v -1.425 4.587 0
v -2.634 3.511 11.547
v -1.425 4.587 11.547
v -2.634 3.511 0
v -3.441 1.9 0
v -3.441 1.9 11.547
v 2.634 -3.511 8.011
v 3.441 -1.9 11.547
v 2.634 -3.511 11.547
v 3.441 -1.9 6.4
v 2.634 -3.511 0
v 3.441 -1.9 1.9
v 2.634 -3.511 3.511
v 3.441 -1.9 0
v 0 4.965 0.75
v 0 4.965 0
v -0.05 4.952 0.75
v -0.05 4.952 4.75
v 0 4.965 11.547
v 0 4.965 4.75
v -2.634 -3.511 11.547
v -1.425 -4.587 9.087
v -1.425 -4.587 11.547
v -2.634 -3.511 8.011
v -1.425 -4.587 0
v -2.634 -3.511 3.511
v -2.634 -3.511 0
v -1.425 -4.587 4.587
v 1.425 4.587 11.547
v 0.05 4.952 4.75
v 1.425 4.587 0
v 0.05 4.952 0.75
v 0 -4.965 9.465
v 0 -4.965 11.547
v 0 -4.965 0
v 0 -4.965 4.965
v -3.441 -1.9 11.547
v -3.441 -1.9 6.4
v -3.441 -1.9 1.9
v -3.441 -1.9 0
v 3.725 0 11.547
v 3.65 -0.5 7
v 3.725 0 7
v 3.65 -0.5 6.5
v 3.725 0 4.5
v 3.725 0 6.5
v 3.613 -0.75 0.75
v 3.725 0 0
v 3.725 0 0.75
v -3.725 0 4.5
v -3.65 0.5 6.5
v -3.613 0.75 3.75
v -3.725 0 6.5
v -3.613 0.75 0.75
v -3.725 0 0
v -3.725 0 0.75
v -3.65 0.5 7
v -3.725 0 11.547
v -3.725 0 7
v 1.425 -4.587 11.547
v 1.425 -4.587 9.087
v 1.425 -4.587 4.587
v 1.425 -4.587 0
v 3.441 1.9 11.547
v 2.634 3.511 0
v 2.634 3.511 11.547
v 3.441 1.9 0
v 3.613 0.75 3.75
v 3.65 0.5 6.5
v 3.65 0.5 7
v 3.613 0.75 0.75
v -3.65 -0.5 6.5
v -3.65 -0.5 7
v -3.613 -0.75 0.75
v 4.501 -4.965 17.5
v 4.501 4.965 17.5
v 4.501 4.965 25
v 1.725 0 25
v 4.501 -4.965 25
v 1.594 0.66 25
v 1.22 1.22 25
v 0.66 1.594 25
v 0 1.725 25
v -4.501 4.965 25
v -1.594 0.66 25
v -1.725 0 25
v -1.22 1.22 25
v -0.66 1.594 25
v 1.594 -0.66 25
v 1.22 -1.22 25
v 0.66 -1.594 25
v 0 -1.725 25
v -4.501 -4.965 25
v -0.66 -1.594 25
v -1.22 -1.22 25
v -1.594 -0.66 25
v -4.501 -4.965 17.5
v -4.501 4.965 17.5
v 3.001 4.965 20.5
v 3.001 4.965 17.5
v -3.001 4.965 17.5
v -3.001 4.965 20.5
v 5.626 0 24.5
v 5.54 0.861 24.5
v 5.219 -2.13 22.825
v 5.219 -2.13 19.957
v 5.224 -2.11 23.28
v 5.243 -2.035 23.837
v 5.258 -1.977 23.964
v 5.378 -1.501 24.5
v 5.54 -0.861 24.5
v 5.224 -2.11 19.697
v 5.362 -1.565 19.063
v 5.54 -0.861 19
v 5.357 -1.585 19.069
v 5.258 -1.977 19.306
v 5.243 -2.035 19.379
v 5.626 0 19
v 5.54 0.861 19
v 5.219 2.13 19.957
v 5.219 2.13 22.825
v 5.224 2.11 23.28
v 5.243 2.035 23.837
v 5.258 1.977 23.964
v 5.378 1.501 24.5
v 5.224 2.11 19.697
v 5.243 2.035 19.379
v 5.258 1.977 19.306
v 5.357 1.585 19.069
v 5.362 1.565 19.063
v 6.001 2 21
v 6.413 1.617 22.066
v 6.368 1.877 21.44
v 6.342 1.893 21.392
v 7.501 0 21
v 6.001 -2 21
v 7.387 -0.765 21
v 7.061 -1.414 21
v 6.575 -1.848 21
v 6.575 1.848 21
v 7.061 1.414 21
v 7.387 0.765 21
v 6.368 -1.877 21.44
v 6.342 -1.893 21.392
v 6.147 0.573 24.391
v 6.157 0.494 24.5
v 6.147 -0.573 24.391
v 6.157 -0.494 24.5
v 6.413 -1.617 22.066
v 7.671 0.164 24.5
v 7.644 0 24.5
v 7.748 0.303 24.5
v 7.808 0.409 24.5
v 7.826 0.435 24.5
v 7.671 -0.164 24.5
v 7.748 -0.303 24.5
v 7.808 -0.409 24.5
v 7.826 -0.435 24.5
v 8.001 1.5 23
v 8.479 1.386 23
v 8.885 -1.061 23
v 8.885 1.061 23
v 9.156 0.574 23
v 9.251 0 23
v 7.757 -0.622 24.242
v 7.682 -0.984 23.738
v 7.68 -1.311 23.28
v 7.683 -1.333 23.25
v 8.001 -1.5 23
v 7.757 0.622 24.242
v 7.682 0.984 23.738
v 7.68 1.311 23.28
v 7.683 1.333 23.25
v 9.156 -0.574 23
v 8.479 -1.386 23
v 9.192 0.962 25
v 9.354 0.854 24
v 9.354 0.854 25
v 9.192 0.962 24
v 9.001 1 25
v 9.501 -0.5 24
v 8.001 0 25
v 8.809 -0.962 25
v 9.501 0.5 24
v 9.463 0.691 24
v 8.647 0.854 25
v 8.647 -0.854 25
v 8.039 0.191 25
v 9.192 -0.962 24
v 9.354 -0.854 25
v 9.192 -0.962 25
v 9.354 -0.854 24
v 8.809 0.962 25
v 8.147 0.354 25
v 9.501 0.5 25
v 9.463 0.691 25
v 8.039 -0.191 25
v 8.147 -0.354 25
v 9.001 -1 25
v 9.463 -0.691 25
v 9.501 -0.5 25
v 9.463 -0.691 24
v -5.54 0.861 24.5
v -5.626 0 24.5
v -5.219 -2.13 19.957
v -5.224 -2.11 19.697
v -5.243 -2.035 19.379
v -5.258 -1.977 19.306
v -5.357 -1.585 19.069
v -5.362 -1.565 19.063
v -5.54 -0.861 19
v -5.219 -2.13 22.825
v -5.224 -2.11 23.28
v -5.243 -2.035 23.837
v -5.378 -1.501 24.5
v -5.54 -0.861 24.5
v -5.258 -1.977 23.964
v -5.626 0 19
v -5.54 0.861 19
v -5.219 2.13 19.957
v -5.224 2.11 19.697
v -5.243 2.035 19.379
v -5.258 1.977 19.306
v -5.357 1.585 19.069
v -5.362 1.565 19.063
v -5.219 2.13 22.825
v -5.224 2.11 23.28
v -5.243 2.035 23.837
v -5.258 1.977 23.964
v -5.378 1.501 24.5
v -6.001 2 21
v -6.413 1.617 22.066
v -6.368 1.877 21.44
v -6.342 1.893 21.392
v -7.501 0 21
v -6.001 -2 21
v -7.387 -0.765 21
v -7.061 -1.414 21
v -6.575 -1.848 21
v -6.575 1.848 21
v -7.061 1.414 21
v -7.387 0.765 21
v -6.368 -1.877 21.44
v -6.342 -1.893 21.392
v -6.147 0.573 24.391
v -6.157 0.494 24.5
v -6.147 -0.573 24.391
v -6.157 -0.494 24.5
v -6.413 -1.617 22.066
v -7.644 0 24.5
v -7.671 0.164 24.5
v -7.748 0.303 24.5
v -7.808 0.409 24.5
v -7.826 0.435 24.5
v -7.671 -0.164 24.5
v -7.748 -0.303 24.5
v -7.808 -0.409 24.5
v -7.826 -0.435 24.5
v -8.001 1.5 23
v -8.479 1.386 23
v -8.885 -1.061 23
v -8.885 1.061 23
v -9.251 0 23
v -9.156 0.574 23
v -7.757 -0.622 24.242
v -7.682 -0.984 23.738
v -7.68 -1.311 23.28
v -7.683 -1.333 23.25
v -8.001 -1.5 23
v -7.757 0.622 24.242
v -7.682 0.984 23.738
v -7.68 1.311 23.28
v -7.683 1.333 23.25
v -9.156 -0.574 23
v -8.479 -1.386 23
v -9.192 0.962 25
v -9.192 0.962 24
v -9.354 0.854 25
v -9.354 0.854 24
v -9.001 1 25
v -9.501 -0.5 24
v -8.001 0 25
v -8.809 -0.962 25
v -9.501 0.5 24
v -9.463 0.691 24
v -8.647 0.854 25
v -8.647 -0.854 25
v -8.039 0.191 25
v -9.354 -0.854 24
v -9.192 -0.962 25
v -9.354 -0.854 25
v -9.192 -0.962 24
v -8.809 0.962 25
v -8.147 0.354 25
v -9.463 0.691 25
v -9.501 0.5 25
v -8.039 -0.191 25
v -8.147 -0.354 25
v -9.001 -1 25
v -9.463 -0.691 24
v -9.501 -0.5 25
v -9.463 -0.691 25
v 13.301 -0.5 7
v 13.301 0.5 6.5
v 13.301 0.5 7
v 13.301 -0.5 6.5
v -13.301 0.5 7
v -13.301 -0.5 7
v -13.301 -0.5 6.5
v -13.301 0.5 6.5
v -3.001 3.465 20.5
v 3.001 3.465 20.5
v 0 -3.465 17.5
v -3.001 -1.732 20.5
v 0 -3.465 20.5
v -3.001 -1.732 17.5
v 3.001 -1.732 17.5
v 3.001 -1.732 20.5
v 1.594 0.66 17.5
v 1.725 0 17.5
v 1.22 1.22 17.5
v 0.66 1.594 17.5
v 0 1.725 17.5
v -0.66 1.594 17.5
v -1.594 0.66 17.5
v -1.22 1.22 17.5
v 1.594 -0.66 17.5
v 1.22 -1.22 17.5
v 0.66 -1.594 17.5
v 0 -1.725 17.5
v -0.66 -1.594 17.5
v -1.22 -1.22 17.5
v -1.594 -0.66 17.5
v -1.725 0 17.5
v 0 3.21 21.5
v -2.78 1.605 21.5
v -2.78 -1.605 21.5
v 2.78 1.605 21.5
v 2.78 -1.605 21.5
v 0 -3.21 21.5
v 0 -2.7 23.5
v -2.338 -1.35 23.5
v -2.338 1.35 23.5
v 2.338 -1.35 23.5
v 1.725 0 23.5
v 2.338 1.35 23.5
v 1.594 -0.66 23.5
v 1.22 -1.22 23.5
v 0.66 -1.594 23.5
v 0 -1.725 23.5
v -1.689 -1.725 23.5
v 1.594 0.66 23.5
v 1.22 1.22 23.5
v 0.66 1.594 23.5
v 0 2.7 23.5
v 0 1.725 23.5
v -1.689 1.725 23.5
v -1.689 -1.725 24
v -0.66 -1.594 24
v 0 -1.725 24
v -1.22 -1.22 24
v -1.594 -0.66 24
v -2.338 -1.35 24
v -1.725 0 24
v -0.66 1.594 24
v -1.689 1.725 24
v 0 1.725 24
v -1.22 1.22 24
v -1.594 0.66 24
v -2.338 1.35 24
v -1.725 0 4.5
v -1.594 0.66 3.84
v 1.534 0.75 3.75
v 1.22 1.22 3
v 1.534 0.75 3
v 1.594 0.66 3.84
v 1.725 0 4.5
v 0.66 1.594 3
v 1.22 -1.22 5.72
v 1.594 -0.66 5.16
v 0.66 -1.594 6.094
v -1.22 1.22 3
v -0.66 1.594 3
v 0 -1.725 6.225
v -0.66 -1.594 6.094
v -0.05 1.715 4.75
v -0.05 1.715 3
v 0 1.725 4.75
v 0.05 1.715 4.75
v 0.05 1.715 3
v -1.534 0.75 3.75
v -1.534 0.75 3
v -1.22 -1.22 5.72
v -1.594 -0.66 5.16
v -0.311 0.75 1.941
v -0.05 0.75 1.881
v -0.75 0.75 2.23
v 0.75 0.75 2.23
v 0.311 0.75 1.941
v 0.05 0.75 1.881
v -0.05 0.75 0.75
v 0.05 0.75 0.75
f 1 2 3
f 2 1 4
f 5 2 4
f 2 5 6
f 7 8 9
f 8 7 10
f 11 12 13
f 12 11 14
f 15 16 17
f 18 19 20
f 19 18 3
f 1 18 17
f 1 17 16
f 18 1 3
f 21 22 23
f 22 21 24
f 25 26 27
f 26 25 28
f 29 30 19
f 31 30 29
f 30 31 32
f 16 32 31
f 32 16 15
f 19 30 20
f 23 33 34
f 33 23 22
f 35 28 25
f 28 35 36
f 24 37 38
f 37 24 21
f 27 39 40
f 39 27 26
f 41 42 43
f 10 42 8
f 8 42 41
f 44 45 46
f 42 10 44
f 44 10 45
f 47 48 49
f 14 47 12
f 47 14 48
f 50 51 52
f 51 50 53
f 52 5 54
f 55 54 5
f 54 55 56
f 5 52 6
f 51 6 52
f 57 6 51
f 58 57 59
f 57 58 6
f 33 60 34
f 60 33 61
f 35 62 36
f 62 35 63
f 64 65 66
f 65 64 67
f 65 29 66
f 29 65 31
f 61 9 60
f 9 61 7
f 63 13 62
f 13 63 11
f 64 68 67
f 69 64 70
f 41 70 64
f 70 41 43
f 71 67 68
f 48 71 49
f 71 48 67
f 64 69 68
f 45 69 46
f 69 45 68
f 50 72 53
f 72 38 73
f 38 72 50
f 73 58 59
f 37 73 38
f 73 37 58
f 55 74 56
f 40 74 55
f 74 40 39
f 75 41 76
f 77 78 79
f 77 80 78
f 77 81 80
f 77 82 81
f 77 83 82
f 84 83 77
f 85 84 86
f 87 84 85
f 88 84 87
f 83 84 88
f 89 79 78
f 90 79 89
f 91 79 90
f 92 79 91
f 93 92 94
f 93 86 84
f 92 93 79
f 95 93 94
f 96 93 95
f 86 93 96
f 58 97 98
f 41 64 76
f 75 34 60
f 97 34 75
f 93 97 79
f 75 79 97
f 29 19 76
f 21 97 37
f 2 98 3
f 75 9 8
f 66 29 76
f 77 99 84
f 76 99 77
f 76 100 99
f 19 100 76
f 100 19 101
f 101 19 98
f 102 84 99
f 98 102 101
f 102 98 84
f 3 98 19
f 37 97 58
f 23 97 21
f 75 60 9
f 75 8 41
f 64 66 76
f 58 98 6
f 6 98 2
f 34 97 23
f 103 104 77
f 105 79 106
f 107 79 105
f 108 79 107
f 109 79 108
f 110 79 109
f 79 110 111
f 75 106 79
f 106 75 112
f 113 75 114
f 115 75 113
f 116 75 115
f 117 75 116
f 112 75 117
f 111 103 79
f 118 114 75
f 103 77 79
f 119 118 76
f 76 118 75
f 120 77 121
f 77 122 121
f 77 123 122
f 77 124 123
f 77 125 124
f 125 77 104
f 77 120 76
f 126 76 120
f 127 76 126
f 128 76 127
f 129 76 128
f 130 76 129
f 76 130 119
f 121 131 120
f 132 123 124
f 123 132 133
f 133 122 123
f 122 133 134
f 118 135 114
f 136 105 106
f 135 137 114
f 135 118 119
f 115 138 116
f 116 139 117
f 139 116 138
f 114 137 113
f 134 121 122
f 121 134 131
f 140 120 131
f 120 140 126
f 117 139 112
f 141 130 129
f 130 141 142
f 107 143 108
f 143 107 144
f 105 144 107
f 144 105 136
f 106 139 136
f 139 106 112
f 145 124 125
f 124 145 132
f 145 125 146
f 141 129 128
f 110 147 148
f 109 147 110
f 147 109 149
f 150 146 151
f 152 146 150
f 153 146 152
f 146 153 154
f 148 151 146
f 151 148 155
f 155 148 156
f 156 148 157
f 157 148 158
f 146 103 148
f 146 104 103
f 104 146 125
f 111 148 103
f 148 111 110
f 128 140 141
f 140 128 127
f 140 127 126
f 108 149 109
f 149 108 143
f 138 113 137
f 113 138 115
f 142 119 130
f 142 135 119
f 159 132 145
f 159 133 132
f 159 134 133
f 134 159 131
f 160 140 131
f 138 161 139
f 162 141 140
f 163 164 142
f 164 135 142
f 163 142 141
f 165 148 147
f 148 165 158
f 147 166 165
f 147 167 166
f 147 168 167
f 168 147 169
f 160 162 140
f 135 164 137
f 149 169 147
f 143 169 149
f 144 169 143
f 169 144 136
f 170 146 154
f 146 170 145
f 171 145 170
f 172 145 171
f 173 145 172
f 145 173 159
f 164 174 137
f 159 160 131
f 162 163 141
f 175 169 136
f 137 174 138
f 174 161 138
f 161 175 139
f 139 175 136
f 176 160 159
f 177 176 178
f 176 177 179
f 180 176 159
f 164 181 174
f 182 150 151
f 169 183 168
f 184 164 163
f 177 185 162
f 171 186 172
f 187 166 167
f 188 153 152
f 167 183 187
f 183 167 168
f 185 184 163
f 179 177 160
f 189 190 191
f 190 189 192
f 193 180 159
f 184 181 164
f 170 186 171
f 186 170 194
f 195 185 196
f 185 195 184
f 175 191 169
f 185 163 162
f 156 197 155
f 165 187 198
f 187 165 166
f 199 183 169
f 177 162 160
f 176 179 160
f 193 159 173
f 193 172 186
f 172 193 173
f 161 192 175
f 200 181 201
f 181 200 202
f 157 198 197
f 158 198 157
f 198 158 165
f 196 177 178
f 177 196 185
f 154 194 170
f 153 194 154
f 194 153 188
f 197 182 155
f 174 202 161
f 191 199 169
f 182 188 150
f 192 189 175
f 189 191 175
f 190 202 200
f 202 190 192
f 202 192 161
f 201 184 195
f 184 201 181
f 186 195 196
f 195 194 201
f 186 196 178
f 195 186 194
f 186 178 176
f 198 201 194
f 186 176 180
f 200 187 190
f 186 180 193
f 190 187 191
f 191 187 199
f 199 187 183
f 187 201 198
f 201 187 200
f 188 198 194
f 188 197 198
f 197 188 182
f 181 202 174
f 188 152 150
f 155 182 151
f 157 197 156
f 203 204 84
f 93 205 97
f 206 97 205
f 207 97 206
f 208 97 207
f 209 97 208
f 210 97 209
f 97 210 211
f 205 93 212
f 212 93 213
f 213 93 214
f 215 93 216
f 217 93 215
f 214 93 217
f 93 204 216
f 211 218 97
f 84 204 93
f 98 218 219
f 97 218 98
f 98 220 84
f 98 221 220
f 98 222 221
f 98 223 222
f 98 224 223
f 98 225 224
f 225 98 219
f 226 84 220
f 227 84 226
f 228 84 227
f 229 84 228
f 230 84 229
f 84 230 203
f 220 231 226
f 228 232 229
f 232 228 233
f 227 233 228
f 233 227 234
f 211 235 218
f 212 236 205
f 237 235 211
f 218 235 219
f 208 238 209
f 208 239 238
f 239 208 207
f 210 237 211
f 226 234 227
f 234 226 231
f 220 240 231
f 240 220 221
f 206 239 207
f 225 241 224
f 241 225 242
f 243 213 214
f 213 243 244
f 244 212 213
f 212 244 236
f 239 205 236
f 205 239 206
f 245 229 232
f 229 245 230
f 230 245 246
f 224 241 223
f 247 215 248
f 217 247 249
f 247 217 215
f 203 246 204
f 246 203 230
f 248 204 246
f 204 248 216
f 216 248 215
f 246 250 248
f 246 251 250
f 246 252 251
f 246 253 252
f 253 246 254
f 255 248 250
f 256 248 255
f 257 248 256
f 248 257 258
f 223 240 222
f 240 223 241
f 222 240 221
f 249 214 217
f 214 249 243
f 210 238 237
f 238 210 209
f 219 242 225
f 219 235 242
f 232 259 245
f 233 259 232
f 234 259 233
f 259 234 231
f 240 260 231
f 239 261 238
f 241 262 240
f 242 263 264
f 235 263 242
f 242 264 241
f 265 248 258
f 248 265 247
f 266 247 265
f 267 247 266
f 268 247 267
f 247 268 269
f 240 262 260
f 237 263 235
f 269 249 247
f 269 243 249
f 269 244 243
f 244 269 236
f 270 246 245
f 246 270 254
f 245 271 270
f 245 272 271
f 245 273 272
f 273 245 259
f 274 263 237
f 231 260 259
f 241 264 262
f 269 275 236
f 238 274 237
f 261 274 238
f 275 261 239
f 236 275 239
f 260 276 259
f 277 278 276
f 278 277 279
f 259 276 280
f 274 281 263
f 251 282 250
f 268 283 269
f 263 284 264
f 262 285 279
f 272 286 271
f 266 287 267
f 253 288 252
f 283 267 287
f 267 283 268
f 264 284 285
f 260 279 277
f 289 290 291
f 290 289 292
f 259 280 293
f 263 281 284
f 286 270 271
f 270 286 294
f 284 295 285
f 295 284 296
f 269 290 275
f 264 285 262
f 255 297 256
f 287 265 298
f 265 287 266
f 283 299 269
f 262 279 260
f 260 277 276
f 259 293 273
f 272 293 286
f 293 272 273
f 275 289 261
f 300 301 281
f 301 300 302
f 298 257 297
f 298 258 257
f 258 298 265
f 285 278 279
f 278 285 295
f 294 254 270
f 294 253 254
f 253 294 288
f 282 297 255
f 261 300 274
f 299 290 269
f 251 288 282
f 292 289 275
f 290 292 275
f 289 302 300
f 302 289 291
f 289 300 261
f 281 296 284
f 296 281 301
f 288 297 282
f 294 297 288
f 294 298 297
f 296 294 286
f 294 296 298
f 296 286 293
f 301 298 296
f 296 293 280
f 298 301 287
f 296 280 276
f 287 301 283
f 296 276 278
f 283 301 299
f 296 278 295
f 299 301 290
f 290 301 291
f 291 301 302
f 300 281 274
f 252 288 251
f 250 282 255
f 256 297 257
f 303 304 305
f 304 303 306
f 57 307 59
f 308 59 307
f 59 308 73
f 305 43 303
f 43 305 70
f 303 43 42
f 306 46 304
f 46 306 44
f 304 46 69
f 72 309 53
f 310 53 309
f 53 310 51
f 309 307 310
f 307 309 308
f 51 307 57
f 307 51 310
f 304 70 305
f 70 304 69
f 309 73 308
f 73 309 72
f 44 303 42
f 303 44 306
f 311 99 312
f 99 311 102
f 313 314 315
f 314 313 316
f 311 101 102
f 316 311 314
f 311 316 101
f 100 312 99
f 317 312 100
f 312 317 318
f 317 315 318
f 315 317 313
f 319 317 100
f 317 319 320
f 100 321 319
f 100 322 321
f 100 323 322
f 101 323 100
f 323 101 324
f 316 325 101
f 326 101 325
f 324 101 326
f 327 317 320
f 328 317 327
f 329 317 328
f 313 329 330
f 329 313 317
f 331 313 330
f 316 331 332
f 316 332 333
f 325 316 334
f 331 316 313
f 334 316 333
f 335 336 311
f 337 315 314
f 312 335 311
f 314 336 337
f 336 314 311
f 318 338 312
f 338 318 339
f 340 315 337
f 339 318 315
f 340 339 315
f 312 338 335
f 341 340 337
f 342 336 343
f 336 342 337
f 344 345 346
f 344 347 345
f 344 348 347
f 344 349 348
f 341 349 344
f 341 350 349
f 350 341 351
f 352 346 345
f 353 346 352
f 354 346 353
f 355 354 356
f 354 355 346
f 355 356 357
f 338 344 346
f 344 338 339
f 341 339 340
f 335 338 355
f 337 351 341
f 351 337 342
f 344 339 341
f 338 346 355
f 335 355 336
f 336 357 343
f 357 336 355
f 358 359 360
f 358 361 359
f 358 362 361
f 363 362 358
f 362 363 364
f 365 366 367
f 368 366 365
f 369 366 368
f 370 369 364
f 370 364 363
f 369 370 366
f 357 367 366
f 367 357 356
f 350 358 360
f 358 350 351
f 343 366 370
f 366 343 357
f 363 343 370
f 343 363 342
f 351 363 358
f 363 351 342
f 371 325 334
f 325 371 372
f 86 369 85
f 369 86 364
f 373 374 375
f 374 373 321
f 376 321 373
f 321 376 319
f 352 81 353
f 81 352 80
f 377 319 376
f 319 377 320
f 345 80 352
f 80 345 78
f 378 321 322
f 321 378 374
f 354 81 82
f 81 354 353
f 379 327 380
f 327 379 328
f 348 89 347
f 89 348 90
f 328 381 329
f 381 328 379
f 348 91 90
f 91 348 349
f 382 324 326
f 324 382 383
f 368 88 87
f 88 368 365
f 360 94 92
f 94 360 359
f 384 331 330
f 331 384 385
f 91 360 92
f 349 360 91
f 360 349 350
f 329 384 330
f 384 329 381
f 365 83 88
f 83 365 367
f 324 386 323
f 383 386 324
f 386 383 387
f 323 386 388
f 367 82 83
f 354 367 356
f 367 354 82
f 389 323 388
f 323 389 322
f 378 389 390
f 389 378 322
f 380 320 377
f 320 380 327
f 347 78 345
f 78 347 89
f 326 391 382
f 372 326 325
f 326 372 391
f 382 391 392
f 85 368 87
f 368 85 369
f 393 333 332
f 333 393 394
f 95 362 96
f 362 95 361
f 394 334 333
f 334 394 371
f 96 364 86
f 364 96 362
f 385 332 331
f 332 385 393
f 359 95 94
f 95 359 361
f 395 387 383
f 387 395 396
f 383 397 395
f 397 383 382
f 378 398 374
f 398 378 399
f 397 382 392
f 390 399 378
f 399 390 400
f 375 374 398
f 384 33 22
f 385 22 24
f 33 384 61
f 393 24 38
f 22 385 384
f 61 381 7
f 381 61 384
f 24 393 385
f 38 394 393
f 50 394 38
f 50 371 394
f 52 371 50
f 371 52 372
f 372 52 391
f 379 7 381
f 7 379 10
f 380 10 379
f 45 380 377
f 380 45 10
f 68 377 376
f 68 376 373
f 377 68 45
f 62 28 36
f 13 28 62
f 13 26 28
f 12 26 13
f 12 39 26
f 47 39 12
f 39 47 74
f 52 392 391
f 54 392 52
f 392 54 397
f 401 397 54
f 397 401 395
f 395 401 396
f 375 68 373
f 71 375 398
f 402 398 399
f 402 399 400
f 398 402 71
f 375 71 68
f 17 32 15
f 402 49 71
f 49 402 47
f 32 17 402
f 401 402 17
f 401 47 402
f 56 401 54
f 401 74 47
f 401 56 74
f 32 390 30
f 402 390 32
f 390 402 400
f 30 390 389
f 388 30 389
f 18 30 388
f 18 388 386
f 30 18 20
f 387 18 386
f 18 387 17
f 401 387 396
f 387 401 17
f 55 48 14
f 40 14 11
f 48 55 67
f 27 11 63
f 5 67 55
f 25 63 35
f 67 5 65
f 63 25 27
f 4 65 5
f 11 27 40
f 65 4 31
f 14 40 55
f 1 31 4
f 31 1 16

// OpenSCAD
// file: libs/libdict.scad
// This library add dictionary like features to openscad
// the dictionary is a list of pairs as we cannot define new types.
// Unlike a python dictionary we cannot do a proper hash table for speed
// so everything is build around the OpenSCAD search function
// There are a lot of assert statements to ensure data in the "dictionary"
// is in the format of
// * A list of lists
// * Each internal list has a length of two
// * First element of each internal list is a string (the key)
// * All keys are unique.


// Private function:
// This function returns true if the value is in the list
// value must be a string.
// No error checking, for use by is_in only!
function _is_in_str(value, list) = 
    search([value], list) != [[]];

// Private function:
// This function returns true if the value is in the list
// value must be a number.
// No error checking, for use by is_in only!
function _is_in_num(value, list) = 
    search(value, list) != [];


// This function returns true if the value is in the list
// value must be a string or a number.
function is_in(value, list) = 
    assert(is_num(value) || is_string(value) , "is_in: value must be a number or string")
    assert(is_list(list), "is_in: list must be a list")
    is_num(value) ? _is_in_num(value, list) : _is_in_str(value, list);

// An errant match is when a non-list matches with the first element in a list
// a list match a non list though. Cannot know which element is the non-list
// but we do know that it is errant if exactly one of them is not a list
function _check_errant_match(list, match) = let(
    non_list = [for (m = match) is_list(list[m])? 0 : 1],
    // note when recording count_nl (counting non lists) it is first recorded before anything is iterated.
    // the second recording happens after i is iterated to 0, then count_nl counts whether non_list[0] is 1
    count = [for (i=-1, count_nl=0; i<len(match);i=i+1,count_nl=count_nl+non_list[i]) count_nl]
    // the last element (count[len(match)] is equal to 1 on an errant match)
) count[len(match)] == 1 ? 0 : 1;

// Returns true if all emements in list are unique.
function is_unique(list) = 
    assert(is_list(list), "is_unique: list must be a list")
    let(
        matches = search(list, list, 0),
        // Assign 1 or 0 depending on is the match length for each element
        // return wether any matches are greater than one (mathcing more than
        // itself)
        // note cannot search for true or false so using 1 and zero
        bool_list = [for (match = matches) if (len(match)==1) 0 
            // should put a 1 here to show they matched but in the case of
            // [1, [1]] it will match both, so need to check if they are
            // both lists or both not list
            else _check_errant_match(list, match)]
    ) !is_in(1, bool_list);

// Private function:
// Checks that the input is a list and that every element is a list
// of length 2.
// No error checking, for use by valid_dict only!
function _is_pairs(list) =
    !is_list(list) ? false :
        len(list)==0 ? false :
            !is_in(0, [for (pair = list) is_list(pair) && len(pair)==2 ? 1: 0]);

// Private function:
// Checks all elements in the list are strings
// No error checking, for use by valid_dict only!
// Strings can't be empty
function _is_list_of_strings(list) =
    !is_in(0, [for (item = list) is_string(item) && len(item)>0 ? 1: 0]);

// Private function:
// Returns the keus in a dictionary
// No error checking, for use by valid_dict only!
function _keylist(dict)  = [for (pair=dict) pair[0]];
 
function valid_dict(dict) =
    //if the input are not pairs return instantly
    !_is_pairs(dict) ? false : let (
        //if they are pairs get all keys
        keys = _keylist(dict),
        all_strings =  _is_list_of_strings(keys),
        unique = is_unique(keys)
    ) (all_strings && unique) ? true : false;

// Key lookup for key value pair "dictionary".
// Unlike the built in lookup this works with strings.
function key_lookup(key, dict) = 
    assert(is_string(key), "`key` must be a string")
    assert(valid_dict(dict), "`dict` must be a valid 'dictionary'")
    let(
        // key is in [] because otherwise openscad will search for each letter rather than the string.
        index = search([key], dict, 1, 0)[0]
    )  assert (index!=[], "Key lookup failed, key not found!") dict[index][1];

// Creates a new dictionary with a key value pair replaced. Pair must already
// be in dictionary.
function replace_value(key, value, dict) = 
    assert(is_string(key), "`key` must be a string")
    assert(valid_dict(dict), "`dict` must be a valid 'dictionary'")
    assert(is_in(key, _keylist(dict)), "`key` not found in dictionary!")
    [for (kv_pair = dict) key!=kv_pair[0] ? kv_pair : [key, value]];


// Creates a new dictionary with a a set of key value pair replaced
// both inputs must be a dictionary. All keys in input must already be
// in dictionary
function replace_multiple_values(rep_dict, dict) =
    assert(valid_dict(rep_dict), "`rep dict` must be a valid 'dictionary'")
    assert(valid_dict(dict), "`dict` must be a valid 'dictionary'")
    let(
        // loop over all keys in replacement dict checking they are in the original
        rep_keys = [for (key = _keylist(rep_dict))
            assert(is_in(key, _keylist(dict)), "`key` not found in dictionary!")
            key
        ]
    ) //Finally return the updated dictionary using this long list comprehension.
    [
        for (kv_pair = dict) let(
            key = kv_pair[0],
            // check if this key is in the replacement dictionary and if so return index
            // key is in [] because otherwise openscad will search for each letter rather
            // than the string.
            index = search([key], rep_dict, 1, 0)[0]
            // if index is empty return original key value pair, else return the key with
            // the replaced value
        ) index == [] ? kv_pair : [key, rep_dict[index][1]]
    ];
// main file
/*

An attempt at an alternative to my ageing "nut_seat_with_flex" design...

(c) 2016 Richard Bowman - released under CERN Open Hardware License

*/

use <utilities.scad>
include <microscope_parameters.scad>

nut_size = 3;
nut_w = 6.3*1.1; //nominal width of the nut (vertex-to-vertex, bigger than flat-flat distance - 6.3 is theoretical value and the 1.03 is determined by experiment)
nut_h = 2.6;
nut_slot = [nut_w*sin(60), nut_w, nut_h+0.4];
shaft_r = nut_size/2 * 1.15; //radius of hole to cut for screw
column_base_r = shaft_r + 2; //radius of the bottom of the actuator column
//column_clearance_w = nut_slot.x + 2*1.5 + 2*7;
column_core = zeroz(nut_slot) + 2*[1.5+7+1, 1.5+1.5, 0];// NB leave z=0 here
wall_t = 1.6; //thickness of the wall around the column for the screw seat

function nut_size() = nut_size;
function column_base_radius() = column_base_r;
function column_core_size() = column_core;
function nut_slot_size() = nut_slot;
function ss_outer(h=-2) = column_core + [wall_t*2,wall_t*2,(h+2)*2];

module nut_trap_and_slot(r, slot, squeeze=0.9, trap_h=-1){
    // A cut-out that will hold a nut.  The nut slots in horizontally
    // along the +y axis, and is pulled up and into the tight part of the
    // nut seat when a screw is inserted.
    hole_r = r*1.15/2;
    trap_h = trap_h<0 ? r : trap_h;
    w = slot.x; //width of the nut entry slot (should be slightly larger than the nut)
    l = slot.y; //length/depth of the slot (now ignored)
    h = slot.z; //height of the slot
    r1 = w/2/cos(30); //bottom of nut trap is large
    r2 = r*squeeze; //top of nut trap is very tight
    sequential_hull(){
        translate([-w/2,999,0]) cube([w,tiny(),h]);
        union(){
            translate([-w/2,l/2-tiny(),0]) cube([w,tiny(),h]);
            rotate(30) cylinder(d=w/sin(60), h=h, $fn=6);
        }
        a = 1/trap_h;
        rotate(30) cylinder(r=r1*(1-a) + r2*a, h=h+1, $fn=6);
        rotate(30) cylinder(r=r2, h=h+trap_h, $fn=6);
    }
    // ensure the hole in the top can be made nicely
    intersection(){
        translate([-999, -hole_r,0]) cube([999, 2*hole_r, h + trap_h + 0.5]);
        rotate(30) cylinder(r=r2, h=999, $fn=6);
    }

}


module m3_nut_trap_with_shaft(slot_angle=0,tilt=0)
{
    // Nut trap for an M3 nut with a screw from the top this is a solid
    // Object difference it from your part.
    // Trap starts at z=1mm and ends at 7.5mm
    // We recommend have the outer stucture occupies the space from z = 0-9mm


    // nut trap

    rotate([tilt,0,0])rotate([0,0,slot_angle]) translate([0,0,1]) union()
    {
        nut_trap_and_slot(nut_size, nut_slot);
        cylinder(r=shaft_r, h=999, $fn=16);
    }

}

module central_actuator_column(h, top){
    //The central column of the actuator including the square head. The column extends down
    //past the bottom of the base and must be cut
    $fn=16;
    r1 = column_base_r; //size of the bottom part
    r2 = sqrt(top.x*top.x+top.y*top.y)/2; //outer radius of top
    sequential_hull(){
        translate([0, 0, -99]){
            resize([2*r1, top.y, tiny()]){
                cylinder(r=r1, h=tiny());
            }
        }
        translate([0, 0, h-top.z - 2*(r2-r1)]){
            resize([2*r1, top.y, tiny()]){
                cylinder(r=r1, h=tiny());
            }
        }
        translate([0, 0, h-top.z/2]){
            cube(top, center=true);
        }
    }
}

module actuator_hooks(h,top){
    //These are the hooks on the actuator
    //Reflect to get two hooks
    reflect([1,0,0]){
        //Translate to the correct postion on the actuator
        translate([top.x/2,0,h]){
            //Mirror as build upside down
            mirror([0,0,1]){
                // The hook is the sequantiall hull of:
                sequential_hull(){
                    //A thin cube on the side wall of the block
                    translate([-tiny(),-top.y/2,0]){
                        cube([tiny(),top.y,top.z]);
                    }
                    //A thin cylinder inside the block so the nex section is thin
                    translate([0, 0, 0.5]){
                        scale([0.5 ,1, 1]){
                            cylinder(d=4.5, h=top.z-2);
                        }
                    }
                    //A compressed truncated cone just outside the block
                    translate([1.5,0,0.5]){
                        resize([3,4,3.5]){
                            cylinder(d1=1, d2=4, h=4);
                        }
                    }
                    //Another compressed truncated cone just under where the
                    //hook rises
                    translate([3.5,0,0.5]){
                        resize([2.5,3.0,1.5]){
                            cylinder(d1=1,d2=3.5);
                        }
                    }
                    // A tri-lobular shape for the top of the hook formed from the union
                    // of three cylinders.
                    union(){
                        reflect([0,1,0]){
                            translate([4.5,0.5,0]){
                                cylinder(d=1,h=1);
                            }
                        }
                        translate([4,0,0]){
                            cylinder(d=1,h=1);
                        }
                    }
                }
            }
        }
    }
}

module actuator_ties(tilt=0, lever_tip=3){
    // The ties for the actuator.
    rotate([tilt,0,0]){
        translate([0, 0, lever_tip+flex_dims().z+3]){
                    cube([ss_outer().x-wall_t, 1, 0.5], center=true);
        }
    }
}

module actuator_column(h, tilt=0, lever_tip=3, flip_nut_slot=false, join_to_casing=true, no_voids=false){
    // An "actuator column", a nearly-vertical tower, with a nut trap and hooks
    // for elastic bands at the top, usually attached to a flexure at the bottom.
    // There's often one of these inside the casing under an adjustment screw/gear
    //h: height of the column
    //tilt: the column is rotated about the x axis
    //lever_tip: height of the actuating lever at its end (can taper up at 45 degrees)
    //flip_nut_slot: if set to true, the nut is inserted from -y
    //join_to_casing: if set to true, the column is joined to the casing by thin threads
    //no_voids: don't leave a void for the nut or screw, used for the drilling jig.

    top = nut_slot + [3,3,nut_size + 1.5]; //size of the top part
    slot_angle = flip_nut_slot ? 180 : 0; //enter from -y if needed
    $fn=16;
    difference(){
        union(){
            rotate([tilt,0,0]){
                central_actuator_column(h, top);
                // hooks for elastic bands/springs
                actuator_hooks(h, top);
            }
            // join the column to the casing, for strength during printing
            // This module does the tilt itself so it can be rendered seperately
            // for instructions
            if(join_to_casing){
                actuator_ties(tilt, lever_tip);
            }
        }

        // nut trap
        if(!no_voids) rotate([tilt,0,0]) rotate(slot_angle)
            translate([0,0,h-top.z]) nut_trap_and_slot(nut_size, nut_slot);

        // shaft for the screw
        // NB this is raised up from the bottom so it stays within the shaft - this may need to change depending on the length of screw we use...
        if(!no_voids) rotate([tilt,0,0]) translate([0,0,lever_tip]){
            cylinder(r=shaft_r, h=999);
            translate([0,0,-lever_tip+1]) cylinder(r1=0, r2=shaft_r, h=lever_tip-1); //pointy bottom (stronger)
        }

        // space for lever and flexure
        translate([-99, -flex_dims().y/2, flex_dims().z]) sequential_hull(){
            cube([999,flex_dims().y,lever_tip]);
            translate([0,-999,999]) cube([999,flex_dims().y,lever_tip]);
        }

        // tiny holes, to increase the perimeter of the bottom bit and make it
        // stronger
        translate([-tiny(),0,flex_dims().z]) cube([2*tiny(), 10, 4]);
        // cut off at the bottom
        mirror([0,0,1]) cylinder(r=999,h=999,$fn=4);
    }
}
actuator_column(25);


module actuator_end_cutout(lever_tip=3-0.5 ){
    // This shape cuts off the end of an actuator, leaving a thin strip to
    // connect to the actuator column (the flexure).
    sequential_hull(){
        translate([-999,-flex_dims().y/2,flex_dims().z]) cube([2,2,2]*999);
        translate([-999,-flex_dims().y/2,flex_dims().z+lever_tip]) cube([2,2,2]*999);
        translate([-999,-flex_dims().y/2-999,flex_dims().z+999]) cube([2,2,2]*999);
    }
}

module nut_seat_silhouette(r=ss_outer().y/2, dx=ss_outer().x-ss_outer().y, offset=0){
    // a (2D) shape made from the convex hull of two circles
    //    hull() reflect([1,0]) translate([x,0]) circle(r=r);
    // we don't actually build it like that though, as the hull is a slow operation...
    union(){
        reflect([1,0]) translate([dx/2,0]) circle(r=r+offset);
        square([dx,2*(r+offset)], center=true);
    }
}

module nut_seat_void(h=1, tilt=0, center=true){
    // Inside of the actuator column housing (should be subtracted
    // h is the height of the top (excluding nut hole)
    // center=true will cause it to punch through the bottom.
    // This ensures enough clearance to let the actuator column move.
    r = column_core.y/2;
    x = column_core.x/2 - r;
    rotate([tilt,0,0]) intersection(){
        linear_extrude(999,center=center) nut_seat_silhouette(offset=-wall_t);
        translate([0,0,h]) rotate(90) hole_from_bottom(nut_size*1.1/2, h=999, base_w=999);
    }
}
//color("red")nut_seat_void(10,tilt=-10);

module screw_seat_shell(h=1, tilt=0){
    // Outside of the actuator column housing - this is the structure that
    // the gear sits on top of.  It needs to be hollowed out before use
    // (see screw_seat)
    r = ss_outer(h).y/2;
    x = ss_outer(h).x/2 - r;
    double_h = ss_outer(h).z;
    difference(){
        rotate([tilt,0,0]) hull(){
            linear_extrude(double_h-3, center=true) nut_seat_silhouette();
            linear_extrude(double_h, center=true) nut_seat_silhouette(offset=-2);
        }
        mirror([0,0,1]) cylinder(r=999,h=999,$fn=8); //ground
        // hole through which we can insert the nut
        //rotate([tilt,0,0]) translate([-99,column_core.y/3, h-16]) cube(999); //this gets added later
    }
}

module motor_lugs(h=20, tilt=0, angle=0){
    // lugs to mount a micro geared stepper motor on a screw_seat.
    motor_shaft_pos=[0,-20,h+2]; //see height of screw_seat_shell above
    motor_screw_pos=[35/2,motor_shaft_pos.y+7.8,motor_shaft_pos.z+11];
    screw_r = sqrt(pow(motor_screw_pos.x,2)+pow(motor_screw_pos.y,2));
    rotate([tilt,0,0]) rotate(angle) reflect([1,0,0]) difference(){
        union(){
            hull(){
                translate(motor_screw_pos-[0,0,11]) cylinder(r=4,h=11);
                translate([0,0,motor_screw_pos.z-screw_r-11]) cylinder(r=5,h=screw_r-5);
            }
        }
        //space for gears
        translate([0,0,h]) cylinder(r1=8,r2=17,h=2+tiny());
        translate([0,0,h+2]) cylinder(h=999,r=17);
        //hollow inside of the structure
        rotate(-angle) nut_seat_void(h=h, tilt=tilt);
        //mounting screws
        translate(motor_screw_pos) trylinder_selftap(4,h=40,center=true);
    }
}

module screw_seat(h=25, travel=5, tilt=0, entry_w=2*column_base_r+3, extra_entry_h=7, motor_lugs=false, lug_angle=0, label=""){
    // This forms a hollow column, usually built around an actuator_column to
    // support the screw (see screw_seat_shell)
    entry_h = extra_entry_h + travel; //ensure the actuator can move
    nut_slot_z = h-nut_size-1.5-nut_slot.z;
    difference(){
        union(){
            screw_seat_shell(h=h + travel, tilt=tilt);
            if(motor_lugs) rotate(180) motor_lugs(h=h + travel, angle=lug_angle, tilt=-tilt);
            if(len(label) > 0) rotate([tilt,0,0]) translate([0, ss_outer(h).y/2, nut_slot_z - 2]){
                rotate([90,0,0]) linear_extrude(1, center=true) mirror([1,0])
                        text(label, size=10, font="Sans", halign="center", valign="top");
            }

        }
        nut_seat_void(h=h + travel, tilt=tilt); //hollow out the inside

        edge_y = ss_outer(h).y/2; //allow the actuator to poke in
        smatrix(zy=sin(tilt)) translate([0,-edge_y,0])
                    cube([entry_w, edge_y, entry_h*2], center=true);

        //entrance slot for nut
        rotate([tilt,0,0]) translate([0,0,nut_slot_z]) nut_trap_and_slot(nut_size, nut_slot + [0,0,0.3]);
    }
}

module screw_seat_outline(h=999,adjustment=0,center=false,tilt=0){
    // The bottom of a screw seat
    rotate([tilt,0,0]) linear_extrude(h,center=center) nut_seat_silhouette(offset=adjustment);
}


module tilted_actuator(pivot_z, pivot_w, lever, column_h=actuator_h, base_w = column_base_r*2){
    // A lever with its pivot wide and high, actuated by the above actuator
    pw = pivot_w;
    pz = pivot_z;
    nut_y = flex_dims().y + sqrt(lever*lever - pivot_z*pivot_z);
    tip_h = 3;
    difference(){
        reflect([1,0,0]){
            // pivot flexures
            translate([-pw/2, -tiny(), pz]) cube(flex_dims() + [0,2*tiny(),0]);
            // arms linking flexures to actuator column
            sequential_hull(){
                translate([-pw/2, flex_dims().y, pz]) cube(flex_dims());
                union(){
                    translate([-base_w/2, flex_dims().y, 0]) cube([base_w, tiny(), 5]);
                    translate([-column_base_r, nut_y-12, 0]) cube([2*column_base_r, tiny(), 5]);
                }
                translate([0, nut_y, 0]) cylinder(r=column_base_r, h=5);
            }
        }
        // cut-out to form the flexure for the column
        translate([-99, nut_y - flex_dims().y/2, flex_dims().z]) cube([1,1,1]*999);
        hull() repeat([0,-5,5],2) {
            translate([-99, nut_y - flex_dims().y/2, tip_h]) cube([1,1,1]*999);
        }
    }
    translate([0, nut_y, 0]) actuator_column(column_h, -asin(pivot_z/lever), flip_nut_slot=true);
}

module untilted_actuator(pushstick_z, pivot_w, lever, column_h=actuator_h, pushstick_w=6){
    // A lever with its pivot at the bottom, actuated by a column at the end.
    pw = pivot_w;
    pz = pushstick_z;
    nut_y = flex_dims().y + lever;
    tip_h = 3;
    base_w = 2*column_base_r;
    difference(){
        reflect([1,0,0]){
            // pivot flexures
            translate([-pw/2, -tiny(), 0]) cube(flex_dims() + [0,2*tiny(),0]);
            // arms linking flexures to actuator column
            sequential_hull(){
                union(){
                    translate([-pushstick_w/2, flex_dims().y, pz]) cube(flex_dims());
                    translate([-pw/2, flex_dims().y, 0]) cube(flex_dims());
                }
                translate([-base_w/2, nut_y - 20, 0]) cube([base_w, 8, 5]);
                translate([0, nut_y, 0]) cylinder(r=column_base_r, h=5);
            }
        }
        // cut-out to form the flexure for the column
        translate([-99, nut_y - flex_dims().y/2, flex_dims().z]) cube([1,1,1]*999);
        hull() repeat([0,-5,5],2) {
            translate([-99, nut_y - flex_dims().y/2, tip_h]) cube([1,1,1]*999);
        }
    }
    translate([0, nut_y, 0]) actuator_column(column_h, 0);
}

module actuator_void(h, w1, w2, lever, tilted=false, extend_back=tiny()){
    // A solid object that's big enough to give clearance for an actuator
    c = tiny(); //additional clearance (makes it angular)
    w_n = 2*column_base_r + 2*c; // width of neck
    nut_y = tilted ? sqrt(lever*lever - h*h) : lever;
    tilt = tilted?-asin(h/lever):0;
    top_dy = tilted ? 0 : h*flex_a()+1;
    minkowski(){
        hull(){
            translate([-min(w1,w2)/2-c, -extend_back, -tiny()]) cube([min(w1,w2)+2*c,tiny(),h]);
            translate([-w1/2-c, 0, -tiny()]) cube([w1+2*c,tiny(),c]);
            translate([-w2/2-c, top_dy, h]) cube([w2+2*c,tiny(),c]);
            translate([-w_n/2, nut_y, -tiny()]) rotate([tilt,0,0]) cube([w_n, 2, 5 + lever*flex_a()+c+1.5]);

        }
        scale([1,1,1.5]) sphere(r=1.5, $fn=8);
    }
}

module flexure_anchor_cutout(h=999,w=999, extend_back=999){
    // A flexure anchor that is 999 wide and deep (for subtraction)
    // If we subtract this from an actuator_void, it leaves a good
    // solid chunk inside the actuator shroud for the actuator to
    // pivot around.
    intersection(){
        mirror([0,1,0]) hull() reflect([1,0,0]){
            translate([0,extend_back,h/2]) cube([999,tiny(),tiny()]);
            translate([0,0,flex_dims().z]) mirror([0,0,1]) cube(999);
        }

        cube([999,w,h],center=true);
    }
}

module actuator_shroud_shell(h, w1, w2, lever, tilted=false, extend_back=tiny(), ac_h=actuator_h, motor_lugs=motor_lugs){
    // A cover for an actuator as defined above.
    ns_h = ac_h + lever * flex_a() + 1.5; //internal height of nut seat
    nut_y = flex_dims().y + (tilted ? sqrt(lever*lever - h*h) : lever);
    tilt = tilted?-asin(h/lever):0;

    difference(){
        union(){
            minkowski(){
                actuator_void(h, w1, w2, lever, tilted, extend_back);
                //sphere(r=wall_t,$fn=8);
                cylinder(r=wall_t,$fn=16,h=0.8);
            }
            translate([0,nut_y,0]) screw_seat_shell(ns_h, tilt);
            translate([0,nut_y,0]) motor_lugs(ns_h, tilt);

        }
        mirror([0,0,1]) cylinder(r=999,h=999,$fn=8); //don't extend below ground
        translate([0,-extend_back,0]) rotate([90,0,0]) cylinder(r=999,h=999,$fn=8); //cut off at the end, so we don't go past the back and close it off
    }
}
module actuator_shroud_core(h, w1, w2, lever, tilted=false, extend_back=tiny(), ac_h=actuator_h, anchor=true, pushstick_h=pushstick.z+3){
    // The inside of a cover for an actuator as defined above.
    // It's split like this for ease of combining them together.
    ns_h = ac_h + lever * flex_a() + 1.5; //internal height of nut seat
    nut_y = flex_dims().y + (tilted ? sqrt(lever*lever - h*h) : lever);
    tilt = tilted?-asin(h/lever):0;

    difference(){
        actuator_void(h, w1, w2, lever, tilted, extend_back); //cut out so it's hollow
        if(tilted){ //make the void smaller so we get an anchor
            translate([0,0,h+flex_dims().z]) mirror([0,0,1]) flexure_anchor_cutout(h=2*(h-pushstick_h), extend_back=extend_back);
        }else{
            flexure_anchor_cutout(h=2*(h-pushstick_h), extend_back=extend_back);
        }
    }

    translate([0,nut_y,0]) nut_seat_void(ns_h, tilt); //cut out the nut seat
    // hole through which we can insert the nut
    translate([0,nut_y]) rotate([tilt,0,0])
            rotate(tilted ? 180 : 0)
            translate([-nut_slot.x/2-0.5,0,ac_h-nut_slot.z-nut_size-1.5])
            cube(nut_slot + [1,999,1]);
}

module actuator_shroud(h, w1, w2, lever, tilted=false, extend_back=tiny(), ac_h=actuator_h, anchor=true){
    difference(){
        actuator_shroud_shell(h, w1, w2, lever, tilted=tilted, extend_back=extend_back, ac_h=ac_h);
        actuator_shroud_core(h, w1, w2, lever, tilted=tilted, extend_back=extend_back, ac_h=ac_h, anchor=anchor);
    }
}
